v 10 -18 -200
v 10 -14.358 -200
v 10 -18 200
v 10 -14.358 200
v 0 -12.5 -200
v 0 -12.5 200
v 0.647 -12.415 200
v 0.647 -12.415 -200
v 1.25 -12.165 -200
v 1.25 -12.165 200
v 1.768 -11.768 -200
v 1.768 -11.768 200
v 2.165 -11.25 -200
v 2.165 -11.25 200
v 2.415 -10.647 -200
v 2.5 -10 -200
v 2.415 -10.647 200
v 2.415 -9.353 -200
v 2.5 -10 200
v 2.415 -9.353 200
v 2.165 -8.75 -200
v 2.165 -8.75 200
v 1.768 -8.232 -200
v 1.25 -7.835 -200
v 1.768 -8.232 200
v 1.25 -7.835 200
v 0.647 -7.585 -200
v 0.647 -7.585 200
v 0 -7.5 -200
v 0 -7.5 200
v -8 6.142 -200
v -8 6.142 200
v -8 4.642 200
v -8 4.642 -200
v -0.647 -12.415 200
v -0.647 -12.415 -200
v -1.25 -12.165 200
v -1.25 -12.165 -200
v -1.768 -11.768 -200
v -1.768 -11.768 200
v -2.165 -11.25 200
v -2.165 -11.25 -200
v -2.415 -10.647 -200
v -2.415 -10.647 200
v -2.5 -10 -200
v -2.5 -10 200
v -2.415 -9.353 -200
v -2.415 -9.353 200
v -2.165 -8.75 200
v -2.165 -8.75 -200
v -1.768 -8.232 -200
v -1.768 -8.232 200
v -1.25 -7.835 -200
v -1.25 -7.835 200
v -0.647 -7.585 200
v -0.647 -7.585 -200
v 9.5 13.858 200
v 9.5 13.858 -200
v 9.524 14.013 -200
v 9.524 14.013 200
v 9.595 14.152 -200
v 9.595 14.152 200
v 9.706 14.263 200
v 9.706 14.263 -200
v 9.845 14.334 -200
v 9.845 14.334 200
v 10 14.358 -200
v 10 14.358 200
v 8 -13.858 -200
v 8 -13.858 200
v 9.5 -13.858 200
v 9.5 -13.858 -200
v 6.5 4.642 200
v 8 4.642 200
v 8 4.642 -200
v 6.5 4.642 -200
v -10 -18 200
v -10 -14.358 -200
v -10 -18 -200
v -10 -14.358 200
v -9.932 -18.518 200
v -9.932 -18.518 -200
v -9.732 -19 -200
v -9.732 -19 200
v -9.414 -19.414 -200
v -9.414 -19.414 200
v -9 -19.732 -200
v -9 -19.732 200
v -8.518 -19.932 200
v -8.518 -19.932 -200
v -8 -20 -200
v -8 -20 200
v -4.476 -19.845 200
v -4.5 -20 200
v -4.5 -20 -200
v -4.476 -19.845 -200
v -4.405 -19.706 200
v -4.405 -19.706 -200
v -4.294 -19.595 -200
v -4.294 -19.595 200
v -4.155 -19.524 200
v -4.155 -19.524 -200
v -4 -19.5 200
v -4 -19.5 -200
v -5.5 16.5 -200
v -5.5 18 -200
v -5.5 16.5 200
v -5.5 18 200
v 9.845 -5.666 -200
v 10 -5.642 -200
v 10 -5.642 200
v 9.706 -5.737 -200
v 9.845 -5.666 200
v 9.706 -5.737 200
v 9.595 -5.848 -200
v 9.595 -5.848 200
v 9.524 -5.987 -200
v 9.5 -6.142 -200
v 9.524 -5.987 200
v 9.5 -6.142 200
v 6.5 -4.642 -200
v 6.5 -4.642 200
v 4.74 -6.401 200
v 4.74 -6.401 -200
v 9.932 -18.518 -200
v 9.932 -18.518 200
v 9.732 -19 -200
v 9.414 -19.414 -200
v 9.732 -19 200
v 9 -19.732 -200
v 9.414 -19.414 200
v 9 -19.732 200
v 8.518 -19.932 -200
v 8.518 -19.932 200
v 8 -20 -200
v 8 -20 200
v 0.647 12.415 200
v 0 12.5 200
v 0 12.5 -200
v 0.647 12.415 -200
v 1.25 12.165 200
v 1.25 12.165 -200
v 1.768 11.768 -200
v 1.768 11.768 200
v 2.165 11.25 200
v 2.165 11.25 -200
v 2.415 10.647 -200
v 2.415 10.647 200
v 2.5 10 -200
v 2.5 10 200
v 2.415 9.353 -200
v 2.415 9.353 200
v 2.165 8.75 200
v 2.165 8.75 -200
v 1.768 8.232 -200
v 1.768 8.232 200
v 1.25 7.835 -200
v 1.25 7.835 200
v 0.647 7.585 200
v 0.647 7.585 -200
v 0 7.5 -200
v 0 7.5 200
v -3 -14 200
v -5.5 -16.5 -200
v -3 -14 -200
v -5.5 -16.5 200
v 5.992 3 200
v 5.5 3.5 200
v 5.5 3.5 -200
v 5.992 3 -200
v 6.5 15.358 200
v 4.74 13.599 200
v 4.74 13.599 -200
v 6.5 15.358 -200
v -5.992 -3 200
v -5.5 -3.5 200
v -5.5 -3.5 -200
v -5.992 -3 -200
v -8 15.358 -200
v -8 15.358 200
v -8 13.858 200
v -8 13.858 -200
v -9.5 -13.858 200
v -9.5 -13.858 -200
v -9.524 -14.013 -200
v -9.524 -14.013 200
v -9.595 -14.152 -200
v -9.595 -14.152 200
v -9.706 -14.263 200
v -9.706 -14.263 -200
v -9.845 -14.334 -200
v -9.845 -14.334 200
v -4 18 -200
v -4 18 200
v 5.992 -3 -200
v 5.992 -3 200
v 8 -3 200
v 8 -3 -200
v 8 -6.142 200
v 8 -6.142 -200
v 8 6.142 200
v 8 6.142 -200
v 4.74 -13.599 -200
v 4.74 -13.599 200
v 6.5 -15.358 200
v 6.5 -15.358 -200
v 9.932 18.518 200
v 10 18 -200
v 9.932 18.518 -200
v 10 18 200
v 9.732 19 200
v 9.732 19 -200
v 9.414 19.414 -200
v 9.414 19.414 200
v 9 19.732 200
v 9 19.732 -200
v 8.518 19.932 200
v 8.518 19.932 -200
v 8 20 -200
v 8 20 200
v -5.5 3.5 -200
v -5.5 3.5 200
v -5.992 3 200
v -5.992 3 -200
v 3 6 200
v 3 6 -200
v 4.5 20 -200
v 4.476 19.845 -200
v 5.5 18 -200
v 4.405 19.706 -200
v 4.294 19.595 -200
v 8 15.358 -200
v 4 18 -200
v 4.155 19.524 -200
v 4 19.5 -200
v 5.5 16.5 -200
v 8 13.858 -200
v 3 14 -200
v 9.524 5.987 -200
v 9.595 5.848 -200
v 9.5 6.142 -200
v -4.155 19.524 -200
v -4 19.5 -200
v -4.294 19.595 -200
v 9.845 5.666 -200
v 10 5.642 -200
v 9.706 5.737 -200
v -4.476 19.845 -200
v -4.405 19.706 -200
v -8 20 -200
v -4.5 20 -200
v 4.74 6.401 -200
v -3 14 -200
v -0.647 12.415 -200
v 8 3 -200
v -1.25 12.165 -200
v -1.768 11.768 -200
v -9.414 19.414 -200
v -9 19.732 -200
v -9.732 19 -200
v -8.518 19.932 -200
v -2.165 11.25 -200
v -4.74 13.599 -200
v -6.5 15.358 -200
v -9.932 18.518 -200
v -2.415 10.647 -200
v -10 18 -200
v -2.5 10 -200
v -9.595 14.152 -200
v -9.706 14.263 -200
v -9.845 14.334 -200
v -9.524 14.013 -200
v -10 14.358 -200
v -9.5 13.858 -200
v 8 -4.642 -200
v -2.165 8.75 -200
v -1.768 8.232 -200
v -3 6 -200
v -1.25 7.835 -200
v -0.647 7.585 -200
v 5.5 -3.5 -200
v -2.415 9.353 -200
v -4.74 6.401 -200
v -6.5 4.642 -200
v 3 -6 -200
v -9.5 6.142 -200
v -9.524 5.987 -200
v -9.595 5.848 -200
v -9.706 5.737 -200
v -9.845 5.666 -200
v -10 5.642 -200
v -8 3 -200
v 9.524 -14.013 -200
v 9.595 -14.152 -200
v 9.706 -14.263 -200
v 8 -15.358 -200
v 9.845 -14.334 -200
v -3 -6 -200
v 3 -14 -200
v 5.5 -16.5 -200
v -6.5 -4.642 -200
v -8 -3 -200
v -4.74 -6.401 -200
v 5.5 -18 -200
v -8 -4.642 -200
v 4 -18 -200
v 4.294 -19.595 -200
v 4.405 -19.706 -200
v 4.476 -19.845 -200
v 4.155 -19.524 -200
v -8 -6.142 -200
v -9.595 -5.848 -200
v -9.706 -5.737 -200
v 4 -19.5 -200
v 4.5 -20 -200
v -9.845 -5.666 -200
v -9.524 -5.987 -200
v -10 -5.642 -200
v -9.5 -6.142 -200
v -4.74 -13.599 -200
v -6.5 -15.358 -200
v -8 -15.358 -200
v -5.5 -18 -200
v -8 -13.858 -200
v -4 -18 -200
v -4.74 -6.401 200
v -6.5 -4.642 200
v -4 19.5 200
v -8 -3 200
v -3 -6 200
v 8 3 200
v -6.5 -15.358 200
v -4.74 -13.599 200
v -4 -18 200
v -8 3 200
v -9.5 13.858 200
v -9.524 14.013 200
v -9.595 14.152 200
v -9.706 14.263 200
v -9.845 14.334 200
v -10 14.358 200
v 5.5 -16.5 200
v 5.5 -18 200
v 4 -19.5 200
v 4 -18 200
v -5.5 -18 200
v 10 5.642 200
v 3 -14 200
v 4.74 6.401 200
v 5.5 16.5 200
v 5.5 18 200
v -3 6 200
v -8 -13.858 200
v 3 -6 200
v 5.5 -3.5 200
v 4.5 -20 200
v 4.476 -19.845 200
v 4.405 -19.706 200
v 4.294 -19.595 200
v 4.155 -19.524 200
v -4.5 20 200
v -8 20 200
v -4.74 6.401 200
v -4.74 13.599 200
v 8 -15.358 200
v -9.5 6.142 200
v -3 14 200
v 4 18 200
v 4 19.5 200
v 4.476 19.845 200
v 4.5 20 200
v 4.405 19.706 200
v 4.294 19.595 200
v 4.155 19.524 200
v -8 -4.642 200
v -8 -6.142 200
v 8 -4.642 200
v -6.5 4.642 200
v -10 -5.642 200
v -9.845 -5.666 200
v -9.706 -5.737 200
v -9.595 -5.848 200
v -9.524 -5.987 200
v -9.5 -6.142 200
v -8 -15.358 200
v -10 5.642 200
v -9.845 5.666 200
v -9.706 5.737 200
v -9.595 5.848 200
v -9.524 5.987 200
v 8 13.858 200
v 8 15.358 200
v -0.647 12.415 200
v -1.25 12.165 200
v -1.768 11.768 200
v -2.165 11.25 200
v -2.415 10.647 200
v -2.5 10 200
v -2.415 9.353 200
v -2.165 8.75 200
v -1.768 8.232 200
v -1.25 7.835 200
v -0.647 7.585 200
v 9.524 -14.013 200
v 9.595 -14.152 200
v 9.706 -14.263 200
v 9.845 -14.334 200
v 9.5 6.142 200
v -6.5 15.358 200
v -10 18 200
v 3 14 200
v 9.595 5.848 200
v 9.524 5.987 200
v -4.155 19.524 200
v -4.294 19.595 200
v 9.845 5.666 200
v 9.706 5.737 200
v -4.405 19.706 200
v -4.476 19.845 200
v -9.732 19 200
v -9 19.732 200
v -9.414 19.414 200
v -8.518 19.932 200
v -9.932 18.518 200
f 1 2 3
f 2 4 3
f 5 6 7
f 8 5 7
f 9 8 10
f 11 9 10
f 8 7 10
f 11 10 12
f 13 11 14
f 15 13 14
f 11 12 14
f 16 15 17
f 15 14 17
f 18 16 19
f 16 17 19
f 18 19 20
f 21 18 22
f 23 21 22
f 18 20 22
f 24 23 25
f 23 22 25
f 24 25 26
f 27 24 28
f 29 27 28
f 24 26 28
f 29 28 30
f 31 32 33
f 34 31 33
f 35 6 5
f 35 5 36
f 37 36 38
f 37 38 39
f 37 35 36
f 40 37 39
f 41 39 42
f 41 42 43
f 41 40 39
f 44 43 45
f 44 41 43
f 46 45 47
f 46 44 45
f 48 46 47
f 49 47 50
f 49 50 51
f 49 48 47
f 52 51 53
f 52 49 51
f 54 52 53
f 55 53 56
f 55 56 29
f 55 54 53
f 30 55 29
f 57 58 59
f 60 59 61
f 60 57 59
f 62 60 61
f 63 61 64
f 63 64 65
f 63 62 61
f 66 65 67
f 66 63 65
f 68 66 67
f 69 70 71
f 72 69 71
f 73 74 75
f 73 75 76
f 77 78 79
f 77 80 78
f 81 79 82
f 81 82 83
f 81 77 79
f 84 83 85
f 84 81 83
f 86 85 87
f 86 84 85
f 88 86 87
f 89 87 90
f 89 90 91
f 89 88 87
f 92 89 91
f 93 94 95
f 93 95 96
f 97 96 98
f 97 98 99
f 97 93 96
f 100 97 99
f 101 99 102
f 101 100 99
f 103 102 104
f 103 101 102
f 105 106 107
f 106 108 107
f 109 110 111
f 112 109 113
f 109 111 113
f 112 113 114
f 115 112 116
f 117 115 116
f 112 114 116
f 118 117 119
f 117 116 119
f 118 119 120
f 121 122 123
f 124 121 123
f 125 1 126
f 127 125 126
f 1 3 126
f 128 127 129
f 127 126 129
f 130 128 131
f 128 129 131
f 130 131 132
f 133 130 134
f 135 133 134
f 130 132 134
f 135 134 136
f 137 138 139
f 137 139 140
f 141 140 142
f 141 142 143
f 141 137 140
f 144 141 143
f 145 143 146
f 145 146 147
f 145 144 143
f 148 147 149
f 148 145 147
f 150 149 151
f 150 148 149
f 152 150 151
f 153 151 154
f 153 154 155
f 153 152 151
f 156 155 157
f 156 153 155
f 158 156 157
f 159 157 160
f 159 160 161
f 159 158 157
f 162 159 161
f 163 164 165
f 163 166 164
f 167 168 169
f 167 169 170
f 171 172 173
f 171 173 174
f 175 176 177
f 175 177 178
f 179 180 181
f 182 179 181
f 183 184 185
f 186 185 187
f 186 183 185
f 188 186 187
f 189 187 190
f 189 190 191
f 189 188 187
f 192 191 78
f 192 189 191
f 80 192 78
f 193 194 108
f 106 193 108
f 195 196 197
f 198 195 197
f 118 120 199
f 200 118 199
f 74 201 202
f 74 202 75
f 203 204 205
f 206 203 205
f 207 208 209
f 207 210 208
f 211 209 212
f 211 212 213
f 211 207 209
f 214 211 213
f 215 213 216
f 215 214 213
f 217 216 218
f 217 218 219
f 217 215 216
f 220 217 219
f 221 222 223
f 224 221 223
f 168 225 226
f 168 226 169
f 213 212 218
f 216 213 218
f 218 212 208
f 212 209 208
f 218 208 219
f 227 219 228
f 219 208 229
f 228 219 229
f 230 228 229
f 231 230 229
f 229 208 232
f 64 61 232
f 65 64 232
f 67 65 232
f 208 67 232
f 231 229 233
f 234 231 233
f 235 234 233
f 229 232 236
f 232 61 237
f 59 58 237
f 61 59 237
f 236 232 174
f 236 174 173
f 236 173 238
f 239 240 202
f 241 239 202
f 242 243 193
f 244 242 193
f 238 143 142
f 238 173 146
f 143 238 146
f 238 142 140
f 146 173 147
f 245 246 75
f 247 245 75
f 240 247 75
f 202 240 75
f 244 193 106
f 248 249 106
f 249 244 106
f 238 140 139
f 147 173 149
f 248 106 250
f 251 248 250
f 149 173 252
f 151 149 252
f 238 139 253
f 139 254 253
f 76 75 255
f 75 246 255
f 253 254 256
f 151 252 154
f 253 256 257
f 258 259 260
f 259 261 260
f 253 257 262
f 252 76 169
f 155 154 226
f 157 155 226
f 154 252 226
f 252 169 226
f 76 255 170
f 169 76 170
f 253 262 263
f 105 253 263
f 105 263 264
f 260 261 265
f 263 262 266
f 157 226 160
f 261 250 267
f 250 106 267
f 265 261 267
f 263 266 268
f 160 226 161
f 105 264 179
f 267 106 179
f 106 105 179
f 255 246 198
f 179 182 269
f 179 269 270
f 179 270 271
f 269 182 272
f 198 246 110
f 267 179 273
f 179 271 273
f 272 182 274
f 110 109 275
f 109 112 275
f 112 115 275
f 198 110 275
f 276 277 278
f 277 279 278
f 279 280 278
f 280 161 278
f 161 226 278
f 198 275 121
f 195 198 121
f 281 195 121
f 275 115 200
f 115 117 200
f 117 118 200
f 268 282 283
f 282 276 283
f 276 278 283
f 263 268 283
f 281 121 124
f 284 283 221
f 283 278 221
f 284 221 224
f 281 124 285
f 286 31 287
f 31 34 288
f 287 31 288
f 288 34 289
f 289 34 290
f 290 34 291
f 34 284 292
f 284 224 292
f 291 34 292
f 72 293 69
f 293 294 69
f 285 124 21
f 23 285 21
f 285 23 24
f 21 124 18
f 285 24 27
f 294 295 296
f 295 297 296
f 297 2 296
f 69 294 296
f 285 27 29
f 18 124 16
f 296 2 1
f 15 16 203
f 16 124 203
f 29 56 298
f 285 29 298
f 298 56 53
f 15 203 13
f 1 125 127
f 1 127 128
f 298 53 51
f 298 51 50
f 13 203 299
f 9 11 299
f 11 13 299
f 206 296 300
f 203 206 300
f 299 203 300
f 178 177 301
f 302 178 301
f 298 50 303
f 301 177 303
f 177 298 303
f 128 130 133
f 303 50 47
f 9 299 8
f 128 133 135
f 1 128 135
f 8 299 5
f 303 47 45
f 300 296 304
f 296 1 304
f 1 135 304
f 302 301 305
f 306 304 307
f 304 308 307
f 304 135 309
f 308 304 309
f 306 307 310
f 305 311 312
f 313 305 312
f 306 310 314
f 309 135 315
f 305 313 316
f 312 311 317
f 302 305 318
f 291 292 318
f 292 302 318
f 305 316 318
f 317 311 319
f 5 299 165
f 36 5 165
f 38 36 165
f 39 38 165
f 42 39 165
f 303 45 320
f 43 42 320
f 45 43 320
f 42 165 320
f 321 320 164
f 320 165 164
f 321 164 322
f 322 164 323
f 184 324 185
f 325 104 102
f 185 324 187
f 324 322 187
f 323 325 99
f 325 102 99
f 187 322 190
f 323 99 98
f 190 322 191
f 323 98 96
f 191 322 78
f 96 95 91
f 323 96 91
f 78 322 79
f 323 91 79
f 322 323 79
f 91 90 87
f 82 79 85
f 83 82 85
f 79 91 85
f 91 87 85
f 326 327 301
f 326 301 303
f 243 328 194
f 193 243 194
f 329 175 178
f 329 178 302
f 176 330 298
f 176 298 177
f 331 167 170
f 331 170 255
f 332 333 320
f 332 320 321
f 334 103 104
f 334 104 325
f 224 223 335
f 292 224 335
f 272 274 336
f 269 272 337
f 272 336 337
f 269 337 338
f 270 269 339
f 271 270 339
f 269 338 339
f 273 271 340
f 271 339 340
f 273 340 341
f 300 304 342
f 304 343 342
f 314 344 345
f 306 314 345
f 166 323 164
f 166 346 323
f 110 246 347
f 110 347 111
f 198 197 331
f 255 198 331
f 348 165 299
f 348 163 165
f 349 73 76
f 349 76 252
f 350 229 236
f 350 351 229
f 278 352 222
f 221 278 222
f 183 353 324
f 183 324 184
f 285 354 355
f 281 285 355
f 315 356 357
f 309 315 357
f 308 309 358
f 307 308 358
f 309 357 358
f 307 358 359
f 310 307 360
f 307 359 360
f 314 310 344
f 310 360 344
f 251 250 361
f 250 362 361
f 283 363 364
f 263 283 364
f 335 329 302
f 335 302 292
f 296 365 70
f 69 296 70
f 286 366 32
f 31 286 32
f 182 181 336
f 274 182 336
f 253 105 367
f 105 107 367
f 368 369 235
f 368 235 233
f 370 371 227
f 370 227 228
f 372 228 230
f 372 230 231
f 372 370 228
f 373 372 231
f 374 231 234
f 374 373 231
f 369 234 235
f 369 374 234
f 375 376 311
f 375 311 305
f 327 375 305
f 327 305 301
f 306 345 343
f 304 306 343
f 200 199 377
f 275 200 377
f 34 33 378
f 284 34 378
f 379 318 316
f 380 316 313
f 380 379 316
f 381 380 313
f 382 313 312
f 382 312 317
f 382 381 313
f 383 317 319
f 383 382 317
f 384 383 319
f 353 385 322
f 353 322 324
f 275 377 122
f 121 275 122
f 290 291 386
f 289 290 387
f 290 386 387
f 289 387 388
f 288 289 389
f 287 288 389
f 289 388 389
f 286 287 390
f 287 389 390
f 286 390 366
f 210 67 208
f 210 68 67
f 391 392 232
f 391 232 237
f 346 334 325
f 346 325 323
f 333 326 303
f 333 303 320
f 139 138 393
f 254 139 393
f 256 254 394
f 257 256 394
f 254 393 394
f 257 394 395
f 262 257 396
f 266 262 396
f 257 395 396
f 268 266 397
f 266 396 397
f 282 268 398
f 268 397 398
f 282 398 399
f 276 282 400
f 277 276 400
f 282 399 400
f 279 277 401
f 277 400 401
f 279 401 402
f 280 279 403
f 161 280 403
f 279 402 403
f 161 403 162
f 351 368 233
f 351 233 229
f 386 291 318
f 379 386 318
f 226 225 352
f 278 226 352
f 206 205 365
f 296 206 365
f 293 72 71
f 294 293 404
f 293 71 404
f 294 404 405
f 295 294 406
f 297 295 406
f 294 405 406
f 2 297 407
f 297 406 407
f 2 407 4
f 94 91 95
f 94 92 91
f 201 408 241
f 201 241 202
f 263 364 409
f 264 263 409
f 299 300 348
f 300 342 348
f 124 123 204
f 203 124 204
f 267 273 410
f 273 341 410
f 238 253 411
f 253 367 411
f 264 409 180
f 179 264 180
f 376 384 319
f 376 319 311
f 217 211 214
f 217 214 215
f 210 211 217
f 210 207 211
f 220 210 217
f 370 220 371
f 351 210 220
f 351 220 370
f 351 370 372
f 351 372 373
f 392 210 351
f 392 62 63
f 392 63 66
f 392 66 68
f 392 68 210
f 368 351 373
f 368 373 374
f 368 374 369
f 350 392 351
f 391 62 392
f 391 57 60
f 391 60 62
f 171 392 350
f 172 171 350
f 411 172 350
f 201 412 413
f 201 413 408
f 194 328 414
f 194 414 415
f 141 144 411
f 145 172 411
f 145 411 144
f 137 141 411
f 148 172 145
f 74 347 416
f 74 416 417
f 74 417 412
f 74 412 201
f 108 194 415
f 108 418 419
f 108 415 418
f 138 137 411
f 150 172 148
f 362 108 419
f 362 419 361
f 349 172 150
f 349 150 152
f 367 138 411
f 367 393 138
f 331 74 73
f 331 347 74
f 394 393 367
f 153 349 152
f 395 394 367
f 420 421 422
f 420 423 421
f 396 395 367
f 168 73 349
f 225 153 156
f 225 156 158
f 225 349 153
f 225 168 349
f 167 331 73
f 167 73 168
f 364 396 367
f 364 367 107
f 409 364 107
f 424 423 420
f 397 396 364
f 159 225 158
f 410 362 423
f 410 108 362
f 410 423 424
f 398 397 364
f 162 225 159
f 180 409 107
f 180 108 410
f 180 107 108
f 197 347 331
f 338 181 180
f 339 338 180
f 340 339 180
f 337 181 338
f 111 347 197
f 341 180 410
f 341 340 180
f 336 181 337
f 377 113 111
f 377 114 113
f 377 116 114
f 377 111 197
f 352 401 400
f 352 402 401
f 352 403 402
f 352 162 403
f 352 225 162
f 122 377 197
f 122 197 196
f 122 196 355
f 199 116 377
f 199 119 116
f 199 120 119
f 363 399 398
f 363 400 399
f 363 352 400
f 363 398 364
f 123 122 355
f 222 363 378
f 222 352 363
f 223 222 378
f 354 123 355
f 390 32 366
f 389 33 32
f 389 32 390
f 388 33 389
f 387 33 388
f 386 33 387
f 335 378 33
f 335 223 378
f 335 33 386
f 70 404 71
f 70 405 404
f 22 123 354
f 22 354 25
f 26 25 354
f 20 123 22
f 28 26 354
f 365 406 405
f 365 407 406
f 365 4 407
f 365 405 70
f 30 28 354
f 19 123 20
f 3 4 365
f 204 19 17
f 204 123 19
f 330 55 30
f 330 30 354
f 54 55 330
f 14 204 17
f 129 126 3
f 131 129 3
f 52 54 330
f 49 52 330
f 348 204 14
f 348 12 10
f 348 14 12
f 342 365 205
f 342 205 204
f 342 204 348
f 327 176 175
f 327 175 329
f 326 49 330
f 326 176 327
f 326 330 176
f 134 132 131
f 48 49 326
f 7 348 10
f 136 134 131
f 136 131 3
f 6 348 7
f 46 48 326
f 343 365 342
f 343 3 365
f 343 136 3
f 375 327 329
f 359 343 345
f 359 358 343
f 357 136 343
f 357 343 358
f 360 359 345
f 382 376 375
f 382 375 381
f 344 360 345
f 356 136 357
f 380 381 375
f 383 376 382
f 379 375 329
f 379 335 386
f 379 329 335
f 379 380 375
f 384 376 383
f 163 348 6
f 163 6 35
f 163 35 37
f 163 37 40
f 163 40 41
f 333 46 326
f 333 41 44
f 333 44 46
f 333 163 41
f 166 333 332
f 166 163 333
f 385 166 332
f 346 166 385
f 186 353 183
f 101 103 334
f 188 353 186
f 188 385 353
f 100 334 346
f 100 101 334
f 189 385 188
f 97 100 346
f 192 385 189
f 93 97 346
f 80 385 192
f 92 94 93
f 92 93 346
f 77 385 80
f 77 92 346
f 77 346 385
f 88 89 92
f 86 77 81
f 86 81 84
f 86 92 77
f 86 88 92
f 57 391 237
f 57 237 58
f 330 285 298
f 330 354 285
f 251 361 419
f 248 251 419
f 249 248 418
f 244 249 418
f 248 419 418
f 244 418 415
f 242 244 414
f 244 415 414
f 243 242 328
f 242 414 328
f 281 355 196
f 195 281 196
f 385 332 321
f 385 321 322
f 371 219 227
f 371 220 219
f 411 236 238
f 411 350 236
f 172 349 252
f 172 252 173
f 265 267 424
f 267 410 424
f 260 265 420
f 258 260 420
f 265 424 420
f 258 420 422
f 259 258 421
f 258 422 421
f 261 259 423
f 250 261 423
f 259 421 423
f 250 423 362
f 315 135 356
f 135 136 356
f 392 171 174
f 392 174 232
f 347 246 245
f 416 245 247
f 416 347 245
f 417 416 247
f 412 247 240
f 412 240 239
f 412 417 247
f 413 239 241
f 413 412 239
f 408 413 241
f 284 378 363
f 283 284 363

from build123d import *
from build123d.topology import SkipClean

# Parameters (mm, degrees)
EXTRUDE_1_DEPTH       = 200
MIRROR_2_COPY_1_DEPTH = 200
MIRROR_2_COPY_2_DEPTH = 200
FILLET_1_R            = 2


with BuildPart() as part:
    # Эскиз1 → Бобышка-Вытянуть1 (new, symmetric)
    with BuildSketch(Plane.XY):
        with BuildLine():
            Line((3, 14), (0, 14))
            Line((0, 14), (0, 12.5))
            ThreePointArc((0, 12.5), (1.767766953, 11.767766953), (2.5, 10))
            ThreePointArc((2.5, 10), (1.767766953, 8.232233047), (0, 7.5))
            Line((0, 7.5), (0, 6))
            Line((0, 6), (3, 6))
            Line((3, 6), (5.5, 3.5))
            Line((5.5, 3.5), (5.991970664, 3))
            Line((5.991970664, 3), (8, 3))
            Line((8, 3), (8, 0))
            Line((8, 0), (10, 0))
            Line((10, 0), (10, 5.641940268))
            ThreePointArc((10, 5.641940268), (9.646446609, 5.788386877), (9.5, 6.141940268))
            Line((9.5, 6.141940268), (8, 6.141940268))
            Line((8, 6.141940268), (8, 4.641940268))
            Line((8, 4.641940268), (6.5, 4.641940268))
            Line((6.5, 4.641940268), (4.740462433, 6.401477835))
            Line((4.740462433, 6.401477835), (4.740462433, 13.598522165))
            Line((4.740462433, 13.598522165), (6.5, 15.358059732))
            Line((6.5, 15.358059732), (8, 15.358059732))
            Line((8, 15.358059732), (8, 13.858059732))
            Line((8, 13.858059732), (9.5, 13.858059732))
            ThreePointArc((9.5, 13.858059732), (9.646446609, 14.211613123), (10, 14.358059732))
            Line((10, 14.358059732), (10, 20))
            Line((10, 20), (4.5, 20))
            ThreePointArc((4.5, 20), (4.353553391, 19.646446609), (4, 19.5))
            Line((4, 19.5), (4, 18))
            Line((4, 18), (5.5, 18))
            Line((5.5, 18), (5.5, 16.5))
            Line((5.5, 16.5), (3, 14))
        make_face()
    extrude_1 = extrude(amount=EXTRUDE_1_DEPTH, both=True)

    # Зеркальное отражение1: Бобышка-Вытянуть1 across plane
    with SkipClean():  # the faces are left unmerged after this step: merging them gives an invalid solid
        add(extrude_1.mirror(Plane(origin=(0, 0, 0), x_dir=(0, 0, 1), z_dir=(1, 0, 0))))

    # Зеркальное отражение2 copy 1 sketch → Зеркальное отражение2 copy 1 (add, symmetric)
    with SkipClean():  # the faces are left unmerged after this step: merging them gives an invalid solid
        with BuildSketch(Plane(origin=(0, 0, 0), x_dir=(-1, 0, 0), z_dir=(0, 0, 1))):
            with BuildLine():
                Line((3, 14), (0, 14))
                Line((0, 14), (0, 12.5))
                ThreePointArc((0, 12.5), (1.767766953, 11.767766953), (2.5, 10))
                ThreePointArc((2.5, 10), (1.767766953, 8.232233047), (0, 7.5))
                Line((0, 7.5), (0, 6))
                Line((0, 6), (3, 6))
                Line((3, 6), (5.5, 3.5))
                Line((5.5, 3.5), (5.991970664, 3))
                Line((5.991970664, 3), (8, 3))
                Line((8, 3), (8, 0))
                Line((8, 0), (10, 0))
                Line((10, 0), (10, 5.641940268))
                ThreePointArc((10, 5.641940268), (9.646446609, 5.788386877), (9.5, 6.141940268))
                Line((9.5, 6.141940268), (8, 6.141940268))
                Line((8, 6.141940268), (8, 4.641940268))
                Line((8, 4.641940268), (6.5, 4.641940268))
                Line((6.5, 4.641940268), (4.740462433, 6.401477835))
                Line((4.740462433, 6.401477835), (4.740462433, 13.598522165))
                Line((4.740462433, 13.598522165), (6.5, 15.358059732))
                Line((6.5, 15.358059732), (8, 15.358059732))
                Line((8, 15.358059732), (8, 13.858059732))
                Line((8, 13.858059732), (9.5, 13.858059732))
                ThreePointArc((9.5, 13.858059732), (9.646446609, 14.211613123), (10, 14.358059732))
                Line((10, 14.358059732), (10, 20))
                Line((10, 20), (4.5, 20))
                ThreePointArc((4.5, 20), (4.353553391, 19.646446609), (4, 19.5))
                Line((4, 19.5), (4, 18))
                Line((4, 18), (5.5, 18))
                Line((5.5, 18), (5.5, 16.5))
                Line((5.5, 16.5), (3, 14))
            make_face()
        extrude(amount=MIRROR_2_COPY_1_DEPTH, both=True)

    # Зеркальное отражение2 copy 2 sketch → Зеркальное отражение2 copy 2 (add, symmetric)
    with SkipClean():  # the faces are left unmerged after this step: merging them gives an invalid solid
        with BuildSketch(Plane.XY):
            with BuildLine():
                Line((3, -14), (0, -14))
                Line((0, -14), (0, -12.5))
                ThreePointArc((0, -12.5), (1.767766953, -11.767766953), (2.5, -10))
                ThreePointArc((2.5, -10), (1.767766953, -8.232233047), (0, -7.5))
                Line((0, -7.5), (0, -6))
                Line((0, -6), (3, -6))
                Line((3, -6), (5.5, -3.5))
                Line((5.5, -3.5), (5.991970664, -3))
                Line((5.991970664, -3), (8, -3))
                Line((8, -3), (8, 0))
                Line((8, 0), (10, 0))
                Line((10, 0), (10, -5.641940268))
                ThreePointArc((10, -5.641940268), (9.646446609, -5.788386877), (9.5, -6.141940268))
                Line((9.5, -6.141940268), (8, -6.141940268))
                Line((8, -6.141940268), (8, -4.641940268))
                Line((8, -4.641940268), (6.5, -4.641940268))
                Line((6.5, -4.641940268), (4.740462433, -6.401477835))
                Line((4.740462433, -6.401477835), (4.740462433, -13.598522165))
                Line((4.740462433, -13.598522165), (6.5, -15.358059732))
                Line((6.5, -15.358059732), (8, -15.358059732))
                Line((8, -15.358059732), (8, -13.858059732))
                Line((8, -13.858059732), (9.5, -13.858059732))
                ThreePointArc((9.5, -13.858059732), (9.646446609, -14.211613123), (10, -14.358059732))
                Line((10, -14.358059732), (10, -20))
                Line((10, -20), (4.5, -20))
                ThreePointArc((4.5, -20), (4.353553391, -19.646446609), (4, -19.5))
                Line((4, -19.5), (4, -18))
                Line((4, -18), (5.5, -18))
                Line((5.5, -18), (5.5, -16.5))
                Line((5.5, -16.5), (3, -14))
            make_face()
        extrude(amount=MIRROR_2_COPY_2_DEPTH, both=True)

    # Скругление1
    fillet_1_edges = [part.edges().sort_by_distance(p)[0] for p in [
        (-10, -20, 0),
        (10, -20, 0),
        (10, 20, 0),
        (-10, 20, 0),
    ]]
    fillet(fillet_1_edges, radius=FILLET_1_R)


solid = part.part
